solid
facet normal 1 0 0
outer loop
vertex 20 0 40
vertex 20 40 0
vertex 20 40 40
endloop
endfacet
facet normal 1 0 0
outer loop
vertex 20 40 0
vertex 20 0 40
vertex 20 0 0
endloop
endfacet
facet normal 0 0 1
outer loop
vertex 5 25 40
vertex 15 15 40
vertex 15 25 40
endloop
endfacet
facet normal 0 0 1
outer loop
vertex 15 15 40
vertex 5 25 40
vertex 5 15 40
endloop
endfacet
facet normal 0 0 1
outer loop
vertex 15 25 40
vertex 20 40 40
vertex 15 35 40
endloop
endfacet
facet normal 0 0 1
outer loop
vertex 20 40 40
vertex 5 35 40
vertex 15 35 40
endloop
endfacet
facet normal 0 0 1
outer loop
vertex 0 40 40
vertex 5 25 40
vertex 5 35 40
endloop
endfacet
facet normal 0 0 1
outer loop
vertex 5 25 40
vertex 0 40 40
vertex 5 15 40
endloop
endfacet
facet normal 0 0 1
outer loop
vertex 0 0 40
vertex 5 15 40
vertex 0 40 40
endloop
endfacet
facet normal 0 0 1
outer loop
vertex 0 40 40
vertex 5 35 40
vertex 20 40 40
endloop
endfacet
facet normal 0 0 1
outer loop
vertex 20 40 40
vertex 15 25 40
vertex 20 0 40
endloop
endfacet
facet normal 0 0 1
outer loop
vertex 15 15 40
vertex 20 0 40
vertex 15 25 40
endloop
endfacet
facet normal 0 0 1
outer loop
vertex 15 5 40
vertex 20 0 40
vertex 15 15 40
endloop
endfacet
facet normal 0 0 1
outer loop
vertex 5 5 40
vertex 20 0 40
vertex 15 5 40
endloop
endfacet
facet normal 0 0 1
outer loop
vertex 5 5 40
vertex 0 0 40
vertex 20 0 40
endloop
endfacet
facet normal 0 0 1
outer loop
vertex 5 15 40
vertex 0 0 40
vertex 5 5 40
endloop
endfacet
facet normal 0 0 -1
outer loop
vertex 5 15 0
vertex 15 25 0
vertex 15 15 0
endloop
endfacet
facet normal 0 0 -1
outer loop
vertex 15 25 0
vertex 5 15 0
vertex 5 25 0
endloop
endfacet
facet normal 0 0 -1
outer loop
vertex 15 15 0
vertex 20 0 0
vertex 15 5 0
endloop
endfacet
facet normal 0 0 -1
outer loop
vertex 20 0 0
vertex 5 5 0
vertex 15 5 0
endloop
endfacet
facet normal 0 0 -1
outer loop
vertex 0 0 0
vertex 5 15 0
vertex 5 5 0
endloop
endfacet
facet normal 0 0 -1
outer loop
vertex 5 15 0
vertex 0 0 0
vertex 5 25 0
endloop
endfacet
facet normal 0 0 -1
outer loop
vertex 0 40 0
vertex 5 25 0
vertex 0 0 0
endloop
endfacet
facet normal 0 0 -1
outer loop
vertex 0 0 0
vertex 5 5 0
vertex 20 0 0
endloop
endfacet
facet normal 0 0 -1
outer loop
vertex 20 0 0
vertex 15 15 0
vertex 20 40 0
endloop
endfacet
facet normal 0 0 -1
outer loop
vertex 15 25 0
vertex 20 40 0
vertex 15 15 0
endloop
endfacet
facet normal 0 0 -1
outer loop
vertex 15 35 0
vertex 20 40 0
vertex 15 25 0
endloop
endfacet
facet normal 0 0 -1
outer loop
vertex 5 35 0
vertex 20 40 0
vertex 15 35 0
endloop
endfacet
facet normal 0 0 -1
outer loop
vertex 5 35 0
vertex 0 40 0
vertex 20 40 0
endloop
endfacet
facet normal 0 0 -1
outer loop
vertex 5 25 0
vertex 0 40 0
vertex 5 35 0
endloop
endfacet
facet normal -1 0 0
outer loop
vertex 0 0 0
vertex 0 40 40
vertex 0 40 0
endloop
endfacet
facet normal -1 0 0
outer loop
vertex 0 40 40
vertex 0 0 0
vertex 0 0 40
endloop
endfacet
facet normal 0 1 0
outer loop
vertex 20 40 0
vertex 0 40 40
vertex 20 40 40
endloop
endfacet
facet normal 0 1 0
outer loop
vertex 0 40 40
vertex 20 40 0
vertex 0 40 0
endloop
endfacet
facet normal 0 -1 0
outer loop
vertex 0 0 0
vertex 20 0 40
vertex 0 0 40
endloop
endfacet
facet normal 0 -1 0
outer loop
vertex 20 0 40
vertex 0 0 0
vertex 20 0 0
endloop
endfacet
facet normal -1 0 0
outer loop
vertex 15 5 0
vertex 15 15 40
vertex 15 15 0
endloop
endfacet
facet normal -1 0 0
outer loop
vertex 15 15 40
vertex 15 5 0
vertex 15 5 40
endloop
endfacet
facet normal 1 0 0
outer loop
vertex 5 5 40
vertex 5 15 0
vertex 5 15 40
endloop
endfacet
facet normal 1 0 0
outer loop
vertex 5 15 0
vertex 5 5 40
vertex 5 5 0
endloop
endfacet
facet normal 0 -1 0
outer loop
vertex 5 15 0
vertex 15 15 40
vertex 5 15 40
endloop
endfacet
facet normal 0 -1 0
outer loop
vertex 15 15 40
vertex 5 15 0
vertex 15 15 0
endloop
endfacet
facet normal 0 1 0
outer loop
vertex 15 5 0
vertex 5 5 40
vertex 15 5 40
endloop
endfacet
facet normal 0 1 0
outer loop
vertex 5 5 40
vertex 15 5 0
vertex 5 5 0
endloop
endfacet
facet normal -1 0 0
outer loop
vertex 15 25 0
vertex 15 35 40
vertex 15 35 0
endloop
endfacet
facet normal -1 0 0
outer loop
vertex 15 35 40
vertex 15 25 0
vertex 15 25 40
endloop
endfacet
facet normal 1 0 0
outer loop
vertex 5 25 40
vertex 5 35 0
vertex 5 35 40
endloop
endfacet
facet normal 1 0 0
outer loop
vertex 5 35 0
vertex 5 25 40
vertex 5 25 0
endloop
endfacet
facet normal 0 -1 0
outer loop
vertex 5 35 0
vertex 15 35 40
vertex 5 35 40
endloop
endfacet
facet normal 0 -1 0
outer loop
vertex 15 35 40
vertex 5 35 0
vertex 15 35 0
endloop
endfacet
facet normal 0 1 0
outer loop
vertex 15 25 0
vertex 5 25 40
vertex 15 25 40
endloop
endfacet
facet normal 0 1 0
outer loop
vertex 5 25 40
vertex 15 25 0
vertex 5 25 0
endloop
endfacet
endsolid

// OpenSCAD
module profile_2040(len=40){
  difference(){
    cube([20,40,len]);
    translate([5,5,-0.1]) cube([10,10,len+0.2]);
    translate([5,25,-0.1]) cube([10,10,len+0.2]);
  }
}
profile_2040();
